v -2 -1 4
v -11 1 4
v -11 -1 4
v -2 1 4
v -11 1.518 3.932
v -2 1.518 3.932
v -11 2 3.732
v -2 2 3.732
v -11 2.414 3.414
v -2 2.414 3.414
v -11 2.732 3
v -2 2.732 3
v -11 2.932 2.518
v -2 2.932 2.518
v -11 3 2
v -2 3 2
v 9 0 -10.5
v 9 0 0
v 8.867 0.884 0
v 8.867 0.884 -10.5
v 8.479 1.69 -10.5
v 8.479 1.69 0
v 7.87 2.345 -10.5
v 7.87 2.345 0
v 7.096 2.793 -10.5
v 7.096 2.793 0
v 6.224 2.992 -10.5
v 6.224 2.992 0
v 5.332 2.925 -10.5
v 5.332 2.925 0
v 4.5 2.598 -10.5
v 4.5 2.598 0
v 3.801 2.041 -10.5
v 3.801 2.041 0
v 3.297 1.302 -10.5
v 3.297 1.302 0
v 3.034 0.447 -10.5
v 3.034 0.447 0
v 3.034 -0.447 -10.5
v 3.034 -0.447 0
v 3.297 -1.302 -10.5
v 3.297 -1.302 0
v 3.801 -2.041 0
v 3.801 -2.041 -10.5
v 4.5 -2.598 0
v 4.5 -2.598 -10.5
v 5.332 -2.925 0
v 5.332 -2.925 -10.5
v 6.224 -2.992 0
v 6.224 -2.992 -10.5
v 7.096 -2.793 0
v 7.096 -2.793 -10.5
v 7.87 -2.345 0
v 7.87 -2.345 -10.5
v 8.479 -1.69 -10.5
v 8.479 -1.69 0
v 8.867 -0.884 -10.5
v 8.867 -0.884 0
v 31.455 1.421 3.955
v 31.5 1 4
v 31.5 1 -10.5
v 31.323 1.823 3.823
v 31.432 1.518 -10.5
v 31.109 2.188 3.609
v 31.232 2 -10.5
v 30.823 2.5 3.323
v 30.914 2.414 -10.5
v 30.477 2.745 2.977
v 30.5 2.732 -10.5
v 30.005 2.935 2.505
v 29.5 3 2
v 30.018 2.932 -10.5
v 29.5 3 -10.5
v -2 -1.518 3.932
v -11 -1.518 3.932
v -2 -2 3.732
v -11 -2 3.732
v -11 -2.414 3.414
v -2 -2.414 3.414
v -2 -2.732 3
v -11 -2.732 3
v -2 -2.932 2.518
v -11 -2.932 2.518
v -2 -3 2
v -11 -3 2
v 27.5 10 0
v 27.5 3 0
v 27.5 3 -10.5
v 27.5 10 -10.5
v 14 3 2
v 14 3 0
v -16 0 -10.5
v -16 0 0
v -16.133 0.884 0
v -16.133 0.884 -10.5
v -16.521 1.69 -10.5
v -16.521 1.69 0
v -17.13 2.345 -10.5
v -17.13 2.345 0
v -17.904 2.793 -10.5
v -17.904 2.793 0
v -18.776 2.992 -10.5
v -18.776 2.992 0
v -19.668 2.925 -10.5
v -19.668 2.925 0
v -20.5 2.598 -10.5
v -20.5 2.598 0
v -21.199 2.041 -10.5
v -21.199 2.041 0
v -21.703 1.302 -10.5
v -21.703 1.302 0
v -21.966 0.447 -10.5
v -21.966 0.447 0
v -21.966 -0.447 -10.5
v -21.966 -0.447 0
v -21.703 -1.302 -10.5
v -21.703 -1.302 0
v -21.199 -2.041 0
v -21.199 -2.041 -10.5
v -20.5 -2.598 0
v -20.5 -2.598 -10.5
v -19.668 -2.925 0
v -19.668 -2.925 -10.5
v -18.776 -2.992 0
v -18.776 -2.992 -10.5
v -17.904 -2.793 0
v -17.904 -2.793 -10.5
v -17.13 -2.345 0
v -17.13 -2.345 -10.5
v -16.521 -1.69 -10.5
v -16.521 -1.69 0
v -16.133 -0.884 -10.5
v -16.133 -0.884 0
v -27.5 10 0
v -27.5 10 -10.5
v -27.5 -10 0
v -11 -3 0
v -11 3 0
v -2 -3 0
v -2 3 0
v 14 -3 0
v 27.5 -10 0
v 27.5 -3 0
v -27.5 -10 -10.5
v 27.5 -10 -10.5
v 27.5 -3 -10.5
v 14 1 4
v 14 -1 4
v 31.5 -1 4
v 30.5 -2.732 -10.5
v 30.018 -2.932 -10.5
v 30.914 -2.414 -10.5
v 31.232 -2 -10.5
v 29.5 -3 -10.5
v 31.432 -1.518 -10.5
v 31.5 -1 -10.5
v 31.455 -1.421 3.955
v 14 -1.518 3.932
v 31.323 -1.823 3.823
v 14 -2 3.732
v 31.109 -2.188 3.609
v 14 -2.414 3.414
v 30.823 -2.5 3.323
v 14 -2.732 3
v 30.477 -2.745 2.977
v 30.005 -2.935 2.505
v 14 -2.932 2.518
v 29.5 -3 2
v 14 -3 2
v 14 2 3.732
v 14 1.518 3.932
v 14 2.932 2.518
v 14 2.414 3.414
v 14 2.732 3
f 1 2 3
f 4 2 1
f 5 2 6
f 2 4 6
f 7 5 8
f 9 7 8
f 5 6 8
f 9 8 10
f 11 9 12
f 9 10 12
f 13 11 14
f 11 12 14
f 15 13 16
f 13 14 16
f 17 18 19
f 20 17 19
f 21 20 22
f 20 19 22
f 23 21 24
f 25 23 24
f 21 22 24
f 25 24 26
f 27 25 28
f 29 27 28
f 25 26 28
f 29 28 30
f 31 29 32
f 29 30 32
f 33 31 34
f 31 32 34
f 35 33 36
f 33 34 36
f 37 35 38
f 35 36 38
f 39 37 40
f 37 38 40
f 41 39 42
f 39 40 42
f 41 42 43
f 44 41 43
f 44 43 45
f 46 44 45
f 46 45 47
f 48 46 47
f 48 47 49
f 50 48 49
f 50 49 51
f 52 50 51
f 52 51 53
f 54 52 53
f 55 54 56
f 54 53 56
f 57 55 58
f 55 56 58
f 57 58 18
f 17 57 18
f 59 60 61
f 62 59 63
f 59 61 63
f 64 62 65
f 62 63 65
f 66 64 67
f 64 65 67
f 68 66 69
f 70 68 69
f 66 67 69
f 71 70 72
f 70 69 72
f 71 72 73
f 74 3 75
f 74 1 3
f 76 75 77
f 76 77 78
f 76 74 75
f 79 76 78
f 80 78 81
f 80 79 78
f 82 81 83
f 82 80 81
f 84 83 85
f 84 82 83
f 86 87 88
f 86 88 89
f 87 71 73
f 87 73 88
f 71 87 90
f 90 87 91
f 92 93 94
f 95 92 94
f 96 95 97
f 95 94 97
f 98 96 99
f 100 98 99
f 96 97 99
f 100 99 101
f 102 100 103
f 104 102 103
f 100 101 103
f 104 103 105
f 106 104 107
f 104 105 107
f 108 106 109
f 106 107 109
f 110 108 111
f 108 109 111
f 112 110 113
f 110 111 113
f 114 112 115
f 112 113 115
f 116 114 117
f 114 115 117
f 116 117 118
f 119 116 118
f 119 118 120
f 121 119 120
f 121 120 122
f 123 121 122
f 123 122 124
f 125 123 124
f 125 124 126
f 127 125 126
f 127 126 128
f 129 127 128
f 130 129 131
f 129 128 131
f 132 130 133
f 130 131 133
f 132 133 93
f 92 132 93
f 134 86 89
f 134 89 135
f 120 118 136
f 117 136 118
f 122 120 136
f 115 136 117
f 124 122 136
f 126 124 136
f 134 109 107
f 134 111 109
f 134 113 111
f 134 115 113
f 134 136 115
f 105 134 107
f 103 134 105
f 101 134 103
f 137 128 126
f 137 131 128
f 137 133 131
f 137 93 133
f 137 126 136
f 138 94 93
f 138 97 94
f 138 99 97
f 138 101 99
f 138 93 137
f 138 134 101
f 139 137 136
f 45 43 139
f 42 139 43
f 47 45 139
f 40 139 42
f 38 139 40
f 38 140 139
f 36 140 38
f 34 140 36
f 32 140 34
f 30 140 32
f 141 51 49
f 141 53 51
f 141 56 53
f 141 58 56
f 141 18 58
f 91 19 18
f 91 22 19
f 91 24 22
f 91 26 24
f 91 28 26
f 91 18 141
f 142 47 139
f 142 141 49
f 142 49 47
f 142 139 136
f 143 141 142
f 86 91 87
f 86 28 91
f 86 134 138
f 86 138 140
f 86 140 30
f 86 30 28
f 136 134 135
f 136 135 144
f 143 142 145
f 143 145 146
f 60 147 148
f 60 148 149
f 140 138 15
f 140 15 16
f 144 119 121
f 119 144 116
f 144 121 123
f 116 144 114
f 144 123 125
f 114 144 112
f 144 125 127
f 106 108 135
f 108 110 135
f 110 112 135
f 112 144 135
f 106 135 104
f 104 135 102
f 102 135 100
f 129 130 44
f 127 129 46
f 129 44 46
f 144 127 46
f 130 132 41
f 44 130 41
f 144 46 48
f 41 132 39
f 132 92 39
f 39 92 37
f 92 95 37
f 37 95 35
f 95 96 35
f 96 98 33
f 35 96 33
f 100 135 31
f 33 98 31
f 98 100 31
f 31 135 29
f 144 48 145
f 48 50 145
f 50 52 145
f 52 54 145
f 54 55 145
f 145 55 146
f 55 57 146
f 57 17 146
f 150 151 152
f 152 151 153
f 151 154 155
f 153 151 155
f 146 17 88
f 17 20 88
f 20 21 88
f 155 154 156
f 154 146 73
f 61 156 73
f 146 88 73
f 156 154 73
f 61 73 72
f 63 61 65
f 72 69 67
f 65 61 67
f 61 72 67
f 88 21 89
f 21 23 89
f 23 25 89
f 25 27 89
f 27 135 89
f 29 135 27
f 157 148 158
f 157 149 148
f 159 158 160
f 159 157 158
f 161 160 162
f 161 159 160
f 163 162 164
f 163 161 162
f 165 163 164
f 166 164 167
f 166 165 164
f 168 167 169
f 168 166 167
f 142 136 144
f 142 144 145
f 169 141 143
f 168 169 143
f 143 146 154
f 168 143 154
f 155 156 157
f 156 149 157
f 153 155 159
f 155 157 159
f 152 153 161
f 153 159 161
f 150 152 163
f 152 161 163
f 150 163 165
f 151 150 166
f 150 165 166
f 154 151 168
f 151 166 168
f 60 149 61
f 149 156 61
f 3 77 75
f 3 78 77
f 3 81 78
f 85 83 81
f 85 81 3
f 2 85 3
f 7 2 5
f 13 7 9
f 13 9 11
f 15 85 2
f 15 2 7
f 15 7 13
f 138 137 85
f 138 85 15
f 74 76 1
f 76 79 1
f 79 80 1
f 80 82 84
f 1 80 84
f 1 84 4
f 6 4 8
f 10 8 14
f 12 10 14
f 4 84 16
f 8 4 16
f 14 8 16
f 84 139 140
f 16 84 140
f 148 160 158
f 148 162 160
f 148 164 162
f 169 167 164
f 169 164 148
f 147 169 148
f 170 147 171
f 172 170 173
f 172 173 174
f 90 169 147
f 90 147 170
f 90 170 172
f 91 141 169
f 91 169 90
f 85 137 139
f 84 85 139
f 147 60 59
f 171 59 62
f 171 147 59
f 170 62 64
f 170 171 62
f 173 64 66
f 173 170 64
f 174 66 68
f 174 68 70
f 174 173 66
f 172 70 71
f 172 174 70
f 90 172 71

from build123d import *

# Parameters (mm, degrees)
F0_R     = 3
F0_W     = 9
F0_H     = 6
F0_W_2   = 4
F0_W_3   = 13.5
F1_DEPTH = 10.5
F2_DEPTH = 4
F3_R     = 2


with BuildPart() as f1:
    # F0 (on Top) → F1 (new body)
    with BuildSketch(Plane.XY):
        Polygon((27.5, 10), (-27.5, 10), (-27.5, -10), (27.5, -10), (27.5, -3), (14, -3), (14, 3), (27.5, 3), align=None)
        with Locations((-19, 0)):
            Circle(F0_R, mode=Mode.SUBTRACT)
        with Locations((-6.5, 0)):
            Rectangle(F0_W, F0_H, mode=Mode.SUBTRACT)
        with Locations((6, 0)):
            Circle(F0_R, mode=Mode.SUBTRACT)
        with Locations((29.5, 0)):
            Rectangle(F0_W_2, F0_H)
        with Locations((20.75, 0)):
            Rectangle(F0_W_3, F0_H)
        with Locations((-6.5, 0)):
            Rectangle(F0_W, F0_H)
    extrude(amount=-F1_DEPTH)

    # F0 (on Top) → F2 (join)
    with BuildSketch(Plane.XY):
        with Locations((20.75, 0)):
            Rectangle(F0_W_3, F0_H)
        with Locations((29.5, 0)):
            Rectangle(F0_W_2, F0_H)
        with Locations((-6.5, 0)):
            Rectangle(F0_W, F0_H)
    extrude(amount=F2_DEPTH)

    # F3
    f3_edges = [f1.edges().sort_by_distance(p)[0] for p in [
        (22.75, -3, 4),
        (22.75, 3, 4),
        (31.5, 3, -3.25),
        (31.5, -3, -3.25),
        (-6.5, 3, 4),
        (-6.5, -3, 4),
    ]]
    fillet(f3_edges, radius=F3_R)


solid = f1.part
